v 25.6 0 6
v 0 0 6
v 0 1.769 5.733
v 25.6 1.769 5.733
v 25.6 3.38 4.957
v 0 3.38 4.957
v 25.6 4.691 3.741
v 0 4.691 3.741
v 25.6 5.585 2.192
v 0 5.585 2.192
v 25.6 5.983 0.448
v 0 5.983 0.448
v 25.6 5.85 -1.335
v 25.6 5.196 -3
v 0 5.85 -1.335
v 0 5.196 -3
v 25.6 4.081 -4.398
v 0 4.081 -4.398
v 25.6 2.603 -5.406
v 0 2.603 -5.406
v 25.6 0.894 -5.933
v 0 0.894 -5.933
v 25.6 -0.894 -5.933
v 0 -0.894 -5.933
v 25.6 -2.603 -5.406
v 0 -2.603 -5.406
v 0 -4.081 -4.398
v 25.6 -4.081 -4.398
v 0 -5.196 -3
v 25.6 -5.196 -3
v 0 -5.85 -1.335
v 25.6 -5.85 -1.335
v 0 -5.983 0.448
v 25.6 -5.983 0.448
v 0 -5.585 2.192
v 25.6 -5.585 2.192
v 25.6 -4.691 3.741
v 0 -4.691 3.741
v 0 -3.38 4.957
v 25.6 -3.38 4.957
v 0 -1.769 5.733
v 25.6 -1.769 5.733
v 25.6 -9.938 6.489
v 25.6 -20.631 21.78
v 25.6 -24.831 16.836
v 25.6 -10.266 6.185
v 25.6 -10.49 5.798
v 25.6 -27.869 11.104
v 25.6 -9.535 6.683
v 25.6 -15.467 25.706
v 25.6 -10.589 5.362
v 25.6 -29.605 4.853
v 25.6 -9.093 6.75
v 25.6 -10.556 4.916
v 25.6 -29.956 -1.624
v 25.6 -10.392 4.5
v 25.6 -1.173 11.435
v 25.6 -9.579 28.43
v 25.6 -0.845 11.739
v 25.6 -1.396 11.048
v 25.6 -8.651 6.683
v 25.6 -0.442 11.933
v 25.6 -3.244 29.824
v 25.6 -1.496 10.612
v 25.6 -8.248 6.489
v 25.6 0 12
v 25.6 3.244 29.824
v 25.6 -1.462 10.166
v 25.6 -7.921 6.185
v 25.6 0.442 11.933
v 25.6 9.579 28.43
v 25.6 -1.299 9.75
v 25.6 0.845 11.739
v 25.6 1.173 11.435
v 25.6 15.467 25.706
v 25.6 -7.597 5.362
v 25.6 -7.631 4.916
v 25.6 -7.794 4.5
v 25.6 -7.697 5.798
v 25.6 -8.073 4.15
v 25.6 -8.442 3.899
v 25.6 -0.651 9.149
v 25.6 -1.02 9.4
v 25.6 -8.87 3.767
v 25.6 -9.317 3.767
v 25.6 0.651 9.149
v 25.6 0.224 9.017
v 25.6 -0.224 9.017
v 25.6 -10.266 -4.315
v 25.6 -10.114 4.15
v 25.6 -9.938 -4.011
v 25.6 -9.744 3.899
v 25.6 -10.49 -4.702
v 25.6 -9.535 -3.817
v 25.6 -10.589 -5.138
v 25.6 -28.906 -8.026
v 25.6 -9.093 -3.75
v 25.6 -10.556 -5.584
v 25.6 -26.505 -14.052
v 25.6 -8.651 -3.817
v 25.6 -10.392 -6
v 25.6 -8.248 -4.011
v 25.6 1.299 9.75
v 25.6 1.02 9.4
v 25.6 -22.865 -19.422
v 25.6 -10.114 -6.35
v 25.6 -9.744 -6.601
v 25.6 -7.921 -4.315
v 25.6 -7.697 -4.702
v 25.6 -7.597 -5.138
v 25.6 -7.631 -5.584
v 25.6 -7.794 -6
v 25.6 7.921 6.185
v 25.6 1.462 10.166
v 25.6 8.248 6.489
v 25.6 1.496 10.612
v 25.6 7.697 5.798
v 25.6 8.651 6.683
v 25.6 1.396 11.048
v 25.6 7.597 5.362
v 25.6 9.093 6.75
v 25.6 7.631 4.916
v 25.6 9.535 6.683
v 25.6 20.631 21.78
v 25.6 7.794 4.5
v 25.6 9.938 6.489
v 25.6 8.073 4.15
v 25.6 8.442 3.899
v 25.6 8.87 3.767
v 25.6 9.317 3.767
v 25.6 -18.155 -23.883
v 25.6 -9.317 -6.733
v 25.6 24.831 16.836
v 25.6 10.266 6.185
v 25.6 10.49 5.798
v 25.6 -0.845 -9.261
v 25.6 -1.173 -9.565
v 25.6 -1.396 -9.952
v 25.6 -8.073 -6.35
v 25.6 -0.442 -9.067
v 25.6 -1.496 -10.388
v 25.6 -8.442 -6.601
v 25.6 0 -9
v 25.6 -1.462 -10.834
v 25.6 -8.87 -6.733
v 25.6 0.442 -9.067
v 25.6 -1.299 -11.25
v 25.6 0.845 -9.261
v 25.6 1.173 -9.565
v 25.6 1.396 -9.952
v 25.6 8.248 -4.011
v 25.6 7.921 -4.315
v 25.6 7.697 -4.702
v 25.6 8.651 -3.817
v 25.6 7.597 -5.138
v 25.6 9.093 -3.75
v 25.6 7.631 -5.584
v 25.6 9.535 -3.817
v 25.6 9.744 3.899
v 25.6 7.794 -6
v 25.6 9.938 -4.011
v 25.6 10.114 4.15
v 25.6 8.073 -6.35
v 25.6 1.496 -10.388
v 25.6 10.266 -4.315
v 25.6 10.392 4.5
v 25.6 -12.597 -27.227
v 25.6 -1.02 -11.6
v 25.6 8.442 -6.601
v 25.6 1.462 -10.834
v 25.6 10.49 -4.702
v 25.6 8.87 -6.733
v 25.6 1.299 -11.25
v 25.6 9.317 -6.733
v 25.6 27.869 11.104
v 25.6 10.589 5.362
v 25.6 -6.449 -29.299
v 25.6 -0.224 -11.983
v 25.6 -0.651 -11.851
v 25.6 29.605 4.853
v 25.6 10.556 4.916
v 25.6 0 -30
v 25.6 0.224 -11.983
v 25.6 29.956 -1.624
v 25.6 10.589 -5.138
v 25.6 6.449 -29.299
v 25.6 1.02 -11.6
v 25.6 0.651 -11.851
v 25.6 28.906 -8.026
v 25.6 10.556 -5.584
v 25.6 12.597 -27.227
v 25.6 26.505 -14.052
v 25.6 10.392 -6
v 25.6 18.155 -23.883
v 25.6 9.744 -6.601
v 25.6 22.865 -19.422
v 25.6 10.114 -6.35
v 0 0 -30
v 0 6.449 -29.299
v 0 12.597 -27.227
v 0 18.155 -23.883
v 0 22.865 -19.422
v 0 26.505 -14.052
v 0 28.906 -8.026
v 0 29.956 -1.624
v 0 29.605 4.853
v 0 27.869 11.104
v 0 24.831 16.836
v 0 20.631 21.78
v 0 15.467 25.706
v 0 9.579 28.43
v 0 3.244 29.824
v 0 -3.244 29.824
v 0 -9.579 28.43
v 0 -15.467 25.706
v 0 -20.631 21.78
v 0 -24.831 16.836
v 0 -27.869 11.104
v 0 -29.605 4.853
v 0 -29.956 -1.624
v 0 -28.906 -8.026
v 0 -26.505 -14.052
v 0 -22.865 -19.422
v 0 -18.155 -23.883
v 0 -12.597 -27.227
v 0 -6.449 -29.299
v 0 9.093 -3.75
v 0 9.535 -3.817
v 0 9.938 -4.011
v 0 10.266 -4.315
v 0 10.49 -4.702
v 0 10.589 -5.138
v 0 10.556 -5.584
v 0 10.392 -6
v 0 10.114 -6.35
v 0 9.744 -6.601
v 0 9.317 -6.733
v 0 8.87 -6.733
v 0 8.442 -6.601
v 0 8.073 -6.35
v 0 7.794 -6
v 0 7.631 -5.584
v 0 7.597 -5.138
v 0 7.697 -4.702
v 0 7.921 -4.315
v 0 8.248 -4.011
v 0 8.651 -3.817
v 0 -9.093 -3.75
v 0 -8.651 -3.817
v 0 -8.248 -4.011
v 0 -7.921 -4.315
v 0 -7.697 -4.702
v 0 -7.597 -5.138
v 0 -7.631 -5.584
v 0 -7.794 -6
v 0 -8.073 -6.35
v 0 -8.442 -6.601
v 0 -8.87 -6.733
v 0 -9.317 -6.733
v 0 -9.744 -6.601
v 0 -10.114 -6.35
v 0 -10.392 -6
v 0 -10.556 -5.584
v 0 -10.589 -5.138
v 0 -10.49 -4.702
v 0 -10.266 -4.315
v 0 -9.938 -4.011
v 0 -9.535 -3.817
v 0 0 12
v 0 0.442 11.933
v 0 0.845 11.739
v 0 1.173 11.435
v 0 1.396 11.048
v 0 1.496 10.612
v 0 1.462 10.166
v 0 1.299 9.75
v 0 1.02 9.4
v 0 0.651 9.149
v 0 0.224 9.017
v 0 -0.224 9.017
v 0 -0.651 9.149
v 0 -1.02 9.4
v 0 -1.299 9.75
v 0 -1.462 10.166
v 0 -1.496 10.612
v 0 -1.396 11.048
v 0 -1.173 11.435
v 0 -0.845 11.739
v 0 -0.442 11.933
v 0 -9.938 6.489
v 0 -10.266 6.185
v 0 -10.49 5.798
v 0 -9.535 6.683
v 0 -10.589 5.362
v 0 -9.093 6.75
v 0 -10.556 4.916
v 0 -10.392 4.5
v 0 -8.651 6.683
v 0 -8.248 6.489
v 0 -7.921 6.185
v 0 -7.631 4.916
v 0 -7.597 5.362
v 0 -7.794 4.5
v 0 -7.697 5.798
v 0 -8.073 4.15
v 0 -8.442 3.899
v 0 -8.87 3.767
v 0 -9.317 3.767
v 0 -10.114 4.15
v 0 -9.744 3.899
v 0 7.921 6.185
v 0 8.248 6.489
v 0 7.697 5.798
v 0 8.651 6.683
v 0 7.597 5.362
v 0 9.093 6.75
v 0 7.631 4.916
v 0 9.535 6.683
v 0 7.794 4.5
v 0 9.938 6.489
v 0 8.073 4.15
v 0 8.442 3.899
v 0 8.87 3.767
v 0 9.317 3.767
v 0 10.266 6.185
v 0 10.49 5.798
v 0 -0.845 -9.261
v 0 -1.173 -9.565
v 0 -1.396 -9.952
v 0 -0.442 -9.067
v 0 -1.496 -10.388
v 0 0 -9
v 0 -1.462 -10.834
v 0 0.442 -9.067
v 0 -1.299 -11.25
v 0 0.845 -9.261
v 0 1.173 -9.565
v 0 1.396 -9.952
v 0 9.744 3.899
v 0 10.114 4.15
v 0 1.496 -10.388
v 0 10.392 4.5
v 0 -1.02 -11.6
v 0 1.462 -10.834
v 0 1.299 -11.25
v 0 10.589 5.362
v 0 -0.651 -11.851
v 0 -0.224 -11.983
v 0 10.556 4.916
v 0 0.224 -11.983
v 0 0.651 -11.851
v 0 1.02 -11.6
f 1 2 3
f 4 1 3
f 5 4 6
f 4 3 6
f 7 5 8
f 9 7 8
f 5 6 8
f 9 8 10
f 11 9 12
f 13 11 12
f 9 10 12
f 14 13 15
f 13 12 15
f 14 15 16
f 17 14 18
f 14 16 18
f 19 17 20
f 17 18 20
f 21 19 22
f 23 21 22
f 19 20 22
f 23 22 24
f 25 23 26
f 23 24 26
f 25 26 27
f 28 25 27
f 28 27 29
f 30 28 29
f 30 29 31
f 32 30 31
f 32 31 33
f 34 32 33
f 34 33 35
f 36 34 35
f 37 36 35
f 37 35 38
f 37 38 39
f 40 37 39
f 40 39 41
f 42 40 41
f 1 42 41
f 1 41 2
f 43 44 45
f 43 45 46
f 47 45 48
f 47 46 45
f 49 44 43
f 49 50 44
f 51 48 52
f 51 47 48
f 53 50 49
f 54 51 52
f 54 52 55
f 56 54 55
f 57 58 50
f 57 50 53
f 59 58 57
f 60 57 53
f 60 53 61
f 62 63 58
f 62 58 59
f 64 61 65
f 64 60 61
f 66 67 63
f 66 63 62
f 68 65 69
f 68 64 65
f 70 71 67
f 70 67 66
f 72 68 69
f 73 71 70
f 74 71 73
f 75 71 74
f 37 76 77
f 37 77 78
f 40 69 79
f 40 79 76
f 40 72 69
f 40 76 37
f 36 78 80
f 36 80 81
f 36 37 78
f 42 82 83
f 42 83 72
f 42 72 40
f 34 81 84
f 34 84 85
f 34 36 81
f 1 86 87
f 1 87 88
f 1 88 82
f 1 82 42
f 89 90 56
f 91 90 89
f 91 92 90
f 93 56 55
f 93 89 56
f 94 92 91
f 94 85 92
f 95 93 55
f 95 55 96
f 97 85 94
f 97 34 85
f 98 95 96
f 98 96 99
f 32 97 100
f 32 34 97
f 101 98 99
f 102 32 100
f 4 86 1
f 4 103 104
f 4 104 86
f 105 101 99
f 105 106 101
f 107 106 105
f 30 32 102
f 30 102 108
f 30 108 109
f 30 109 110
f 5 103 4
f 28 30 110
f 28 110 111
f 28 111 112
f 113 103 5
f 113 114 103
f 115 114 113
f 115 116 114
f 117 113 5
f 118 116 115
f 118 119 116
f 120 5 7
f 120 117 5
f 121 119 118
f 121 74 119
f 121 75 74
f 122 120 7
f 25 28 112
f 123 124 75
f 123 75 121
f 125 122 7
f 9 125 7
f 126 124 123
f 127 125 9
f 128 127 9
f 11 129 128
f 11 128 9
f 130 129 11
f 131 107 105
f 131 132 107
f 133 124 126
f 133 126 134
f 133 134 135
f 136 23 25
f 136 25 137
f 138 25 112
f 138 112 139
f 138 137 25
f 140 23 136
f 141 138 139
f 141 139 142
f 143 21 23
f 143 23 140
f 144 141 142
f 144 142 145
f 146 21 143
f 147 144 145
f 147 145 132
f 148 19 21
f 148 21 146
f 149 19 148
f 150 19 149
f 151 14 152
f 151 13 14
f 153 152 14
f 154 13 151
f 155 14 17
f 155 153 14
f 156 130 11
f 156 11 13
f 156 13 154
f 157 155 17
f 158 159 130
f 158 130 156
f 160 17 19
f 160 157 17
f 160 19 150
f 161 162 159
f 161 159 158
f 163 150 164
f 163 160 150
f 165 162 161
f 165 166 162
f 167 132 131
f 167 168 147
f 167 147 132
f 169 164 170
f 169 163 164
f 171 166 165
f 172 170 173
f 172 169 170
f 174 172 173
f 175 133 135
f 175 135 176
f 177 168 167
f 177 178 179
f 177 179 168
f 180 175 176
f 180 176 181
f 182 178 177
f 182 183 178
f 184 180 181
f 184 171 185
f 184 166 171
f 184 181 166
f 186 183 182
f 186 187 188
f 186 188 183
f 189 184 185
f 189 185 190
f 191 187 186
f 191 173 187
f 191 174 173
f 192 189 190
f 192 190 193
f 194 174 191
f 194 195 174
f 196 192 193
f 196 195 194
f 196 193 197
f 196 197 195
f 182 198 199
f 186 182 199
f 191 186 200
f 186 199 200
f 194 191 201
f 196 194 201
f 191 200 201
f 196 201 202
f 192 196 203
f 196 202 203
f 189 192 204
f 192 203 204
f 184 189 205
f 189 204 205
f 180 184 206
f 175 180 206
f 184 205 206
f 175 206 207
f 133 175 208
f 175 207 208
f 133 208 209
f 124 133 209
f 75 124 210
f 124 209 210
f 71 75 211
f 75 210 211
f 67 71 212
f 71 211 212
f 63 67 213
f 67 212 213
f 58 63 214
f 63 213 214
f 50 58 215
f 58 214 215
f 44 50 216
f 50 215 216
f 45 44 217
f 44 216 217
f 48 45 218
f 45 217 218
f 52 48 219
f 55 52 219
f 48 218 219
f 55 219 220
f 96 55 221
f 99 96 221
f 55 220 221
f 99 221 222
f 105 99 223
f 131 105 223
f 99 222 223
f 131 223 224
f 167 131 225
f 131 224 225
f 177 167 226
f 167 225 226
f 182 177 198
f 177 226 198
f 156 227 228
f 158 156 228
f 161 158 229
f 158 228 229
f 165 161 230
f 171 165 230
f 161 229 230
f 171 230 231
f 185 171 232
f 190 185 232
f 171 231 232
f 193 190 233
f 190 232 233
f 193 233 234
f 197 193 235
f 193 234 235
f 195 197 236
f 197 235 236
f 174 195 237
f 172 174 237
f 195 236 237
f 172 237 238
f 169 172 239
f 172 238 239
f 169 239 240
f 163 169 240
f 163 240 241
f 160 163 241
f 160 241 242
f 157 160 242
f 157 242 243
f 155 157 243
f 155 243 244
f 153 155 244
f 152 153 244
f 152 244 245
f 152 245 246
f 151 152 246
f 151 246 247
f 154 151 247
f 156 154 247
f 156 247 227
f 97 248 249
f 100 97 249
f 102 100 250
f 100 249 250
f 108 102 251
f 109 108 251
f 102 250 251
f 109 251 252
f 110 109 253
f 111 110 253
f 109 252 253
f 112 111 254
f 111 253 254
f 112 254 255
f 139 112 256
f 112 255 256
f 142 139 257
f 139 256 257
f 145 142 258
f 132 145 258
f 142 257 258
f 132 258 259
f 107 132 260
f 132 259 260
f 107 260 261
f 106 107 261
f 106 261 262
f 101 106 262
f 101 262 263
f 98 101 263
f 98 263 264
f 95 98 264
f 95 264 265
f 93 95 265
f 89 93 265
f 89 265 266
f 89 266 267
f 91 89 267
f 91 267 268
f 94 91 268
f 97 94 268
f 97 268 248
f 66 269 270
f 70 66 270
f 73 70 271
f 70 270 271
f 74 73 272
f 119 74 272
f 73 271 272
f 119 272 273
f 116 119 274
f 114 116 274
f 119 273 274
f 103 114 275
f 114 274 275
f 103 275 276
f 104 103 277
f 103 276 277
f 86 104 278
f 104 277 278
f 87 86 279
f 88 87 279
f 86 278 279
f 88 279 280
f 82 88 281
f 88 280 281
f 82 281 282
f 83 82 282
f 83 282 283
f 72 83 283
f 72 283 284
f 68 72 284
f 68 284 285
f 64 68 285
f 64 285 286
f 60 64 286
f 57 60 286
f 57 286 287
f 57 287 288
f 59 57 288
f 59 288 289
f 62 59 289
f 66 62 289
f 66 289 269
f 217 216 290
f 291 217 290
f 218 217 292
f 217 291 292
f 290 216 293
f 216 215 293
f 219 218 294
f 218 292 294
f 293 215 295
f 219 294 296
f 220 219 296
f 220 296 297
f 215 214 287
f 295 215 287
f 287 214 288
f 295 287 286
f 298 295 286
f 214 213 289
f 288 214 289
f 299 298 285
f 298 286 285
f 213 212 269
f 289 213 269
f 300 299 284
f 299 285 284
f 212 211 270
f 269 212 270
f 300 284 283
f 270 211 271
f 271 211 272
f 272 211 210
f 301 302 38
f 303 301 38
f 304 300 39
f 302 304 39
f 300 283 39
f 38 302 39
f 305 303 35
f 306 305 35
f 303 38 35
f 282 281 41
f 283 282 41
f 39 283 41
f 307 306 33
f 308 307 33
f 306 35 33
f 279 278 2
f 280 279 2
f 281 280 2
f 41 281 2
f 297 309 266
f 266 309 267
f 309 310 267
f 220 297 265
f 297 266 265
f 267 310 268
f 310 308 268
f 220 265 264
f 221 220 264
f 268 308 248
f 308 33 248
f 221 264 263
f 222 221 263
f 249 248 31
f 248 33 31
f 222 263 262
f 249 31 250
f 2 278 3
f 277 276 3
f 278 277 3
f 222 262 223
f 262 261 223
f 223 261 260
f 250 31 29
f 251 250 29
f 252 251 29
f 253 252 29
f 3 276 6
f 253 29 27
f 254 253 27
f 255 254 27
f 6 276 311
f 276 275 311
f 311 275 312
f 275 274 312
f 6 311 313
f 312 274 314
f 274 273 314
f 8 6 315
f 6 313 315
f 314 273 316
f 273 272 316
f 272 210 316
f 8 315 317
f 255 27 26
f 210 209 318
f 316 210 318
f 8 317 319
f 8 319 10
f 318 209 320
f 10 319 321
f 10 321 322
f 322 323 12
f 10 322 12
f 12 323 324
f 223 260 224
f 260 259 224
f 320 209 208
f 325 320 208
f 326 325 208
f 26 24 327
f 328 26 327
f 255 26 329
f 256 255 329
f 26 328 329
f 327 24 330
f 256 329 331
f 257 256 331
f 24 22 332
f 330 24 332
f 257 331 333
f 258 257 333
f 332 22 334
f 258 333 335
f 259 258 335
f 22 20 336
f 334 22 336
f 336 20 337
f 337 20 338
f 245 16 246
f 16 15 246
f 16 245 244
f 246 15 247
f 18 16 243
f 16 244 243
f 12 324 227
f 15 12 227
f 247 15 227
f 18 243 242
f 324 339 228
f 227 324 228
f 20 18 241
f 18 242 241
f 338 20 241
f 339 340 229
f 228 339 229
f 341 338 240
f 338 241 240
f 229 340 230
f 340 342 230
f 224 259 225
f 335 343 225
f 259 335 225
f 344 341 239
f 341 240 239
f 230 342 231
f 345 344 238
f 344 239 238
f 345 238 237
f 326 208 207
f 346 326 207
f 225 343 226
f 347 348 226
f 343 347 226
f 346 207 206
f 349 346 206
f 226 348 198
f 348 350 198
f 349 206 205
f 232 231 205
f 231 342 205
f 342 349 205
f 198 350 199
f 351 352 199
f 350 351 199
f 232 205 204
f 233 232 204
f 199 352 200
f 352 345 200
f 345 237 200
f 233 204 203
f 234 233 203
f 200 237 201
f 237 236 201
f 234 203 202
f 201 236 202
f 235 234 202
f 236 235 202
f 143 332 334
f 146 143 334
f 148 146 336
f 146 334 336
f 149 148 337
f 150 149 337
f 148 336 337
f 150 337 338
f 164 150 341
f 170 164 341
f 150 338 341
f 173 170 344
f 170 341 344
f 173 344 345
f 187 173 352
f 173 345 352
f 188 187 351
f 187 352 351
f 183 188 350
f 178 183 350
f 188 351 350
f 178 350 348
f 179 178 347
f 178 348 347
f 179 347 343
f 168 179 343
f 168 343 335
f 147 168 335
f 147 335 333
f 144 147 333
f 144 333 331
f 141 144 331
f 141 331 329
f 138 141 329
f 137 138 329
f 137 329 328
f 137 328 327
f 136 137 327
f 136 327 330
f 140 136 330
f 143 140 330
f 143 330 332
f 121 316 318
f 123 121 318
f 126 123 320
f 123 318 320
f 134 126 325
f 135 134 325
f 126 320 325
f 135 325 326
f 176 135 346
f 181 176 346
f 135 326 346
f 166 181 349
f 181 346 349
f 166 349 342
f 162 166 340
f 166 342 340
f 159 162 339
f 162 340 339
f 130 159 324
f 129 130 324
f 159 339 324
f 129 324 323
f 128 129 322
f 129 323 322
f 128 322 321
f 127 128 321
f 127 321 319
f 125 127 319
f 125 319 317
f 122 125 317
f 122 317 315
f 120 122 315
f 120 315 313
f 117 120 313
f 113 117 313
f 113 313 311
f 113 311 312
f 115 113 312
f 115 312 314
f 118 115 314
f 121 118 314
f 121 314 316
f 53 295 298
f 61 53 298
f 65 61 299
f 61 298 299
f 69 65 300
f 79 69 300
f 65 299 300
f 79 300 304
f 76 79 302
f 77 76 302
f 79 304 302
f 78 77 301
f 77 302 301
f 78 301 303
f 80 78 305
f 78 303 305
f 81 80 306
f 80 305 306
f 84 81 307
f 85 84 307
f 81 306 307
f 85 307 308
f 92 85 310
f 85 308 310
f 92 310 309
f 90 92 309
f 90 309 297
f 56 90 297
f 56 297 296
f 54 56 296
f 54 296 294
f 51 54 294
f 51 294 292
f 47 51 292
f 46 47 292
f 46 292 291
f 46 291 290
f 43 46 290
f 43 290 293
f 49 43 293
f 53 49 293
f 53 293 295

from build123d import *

# Parameters (mm, degrees)
SKETCH_1_R          = 30
EXTRUDE_1_DEPTH     = 25.6
SKETCH_2_R          = 6
SKETCH_2_R_2        = 1.5
CUT_EXTRUDE_1_DEPTH = 30


with BuildPart() as part:
    # ｽｹｯﾁ1 → ﾎﾞｽ - 押し出し1 (new body)
    with BuildSketch(Plane(origin=(0, 0, 0), x_dir=(0, 0, -1), z_dir=(1, 0, 0))):
        Circle(SKETCH_1_R)
    extrude(amount=EXTRUDE_1_DEPTH)

    # ｽｹｯﾁ2 → ｶｯﾄ - 押し出し1 (cut)
    with BuildSketch(Plane.ZY):
        Circle(SKETCH_2_R)
        with Locations((10.5, 0)):
            Circle(SKETCH_2_R_2)
        with Locations((5.25, -9.09326674)):
            Circle(SKETCH_2_R_2)
        with Locations((-5.25, -9.09326674)):
            Circle(SKETCH_2_R_2)
        with Locations((-10.5, 0)):
            Circle(SKETCH_2_R_2)
        with Locations((-5.25, 9.09326674)):
            Circle(SKETCH_2_R_2)
        with Locations((5.25, 9.09326674)):
            Circle(SKETCH_2_R_2)
    extrude(amount=-CUT_EXTRUDE_1_DEPTH, mode=Mode.SUBTRACT)


solid = part.part
